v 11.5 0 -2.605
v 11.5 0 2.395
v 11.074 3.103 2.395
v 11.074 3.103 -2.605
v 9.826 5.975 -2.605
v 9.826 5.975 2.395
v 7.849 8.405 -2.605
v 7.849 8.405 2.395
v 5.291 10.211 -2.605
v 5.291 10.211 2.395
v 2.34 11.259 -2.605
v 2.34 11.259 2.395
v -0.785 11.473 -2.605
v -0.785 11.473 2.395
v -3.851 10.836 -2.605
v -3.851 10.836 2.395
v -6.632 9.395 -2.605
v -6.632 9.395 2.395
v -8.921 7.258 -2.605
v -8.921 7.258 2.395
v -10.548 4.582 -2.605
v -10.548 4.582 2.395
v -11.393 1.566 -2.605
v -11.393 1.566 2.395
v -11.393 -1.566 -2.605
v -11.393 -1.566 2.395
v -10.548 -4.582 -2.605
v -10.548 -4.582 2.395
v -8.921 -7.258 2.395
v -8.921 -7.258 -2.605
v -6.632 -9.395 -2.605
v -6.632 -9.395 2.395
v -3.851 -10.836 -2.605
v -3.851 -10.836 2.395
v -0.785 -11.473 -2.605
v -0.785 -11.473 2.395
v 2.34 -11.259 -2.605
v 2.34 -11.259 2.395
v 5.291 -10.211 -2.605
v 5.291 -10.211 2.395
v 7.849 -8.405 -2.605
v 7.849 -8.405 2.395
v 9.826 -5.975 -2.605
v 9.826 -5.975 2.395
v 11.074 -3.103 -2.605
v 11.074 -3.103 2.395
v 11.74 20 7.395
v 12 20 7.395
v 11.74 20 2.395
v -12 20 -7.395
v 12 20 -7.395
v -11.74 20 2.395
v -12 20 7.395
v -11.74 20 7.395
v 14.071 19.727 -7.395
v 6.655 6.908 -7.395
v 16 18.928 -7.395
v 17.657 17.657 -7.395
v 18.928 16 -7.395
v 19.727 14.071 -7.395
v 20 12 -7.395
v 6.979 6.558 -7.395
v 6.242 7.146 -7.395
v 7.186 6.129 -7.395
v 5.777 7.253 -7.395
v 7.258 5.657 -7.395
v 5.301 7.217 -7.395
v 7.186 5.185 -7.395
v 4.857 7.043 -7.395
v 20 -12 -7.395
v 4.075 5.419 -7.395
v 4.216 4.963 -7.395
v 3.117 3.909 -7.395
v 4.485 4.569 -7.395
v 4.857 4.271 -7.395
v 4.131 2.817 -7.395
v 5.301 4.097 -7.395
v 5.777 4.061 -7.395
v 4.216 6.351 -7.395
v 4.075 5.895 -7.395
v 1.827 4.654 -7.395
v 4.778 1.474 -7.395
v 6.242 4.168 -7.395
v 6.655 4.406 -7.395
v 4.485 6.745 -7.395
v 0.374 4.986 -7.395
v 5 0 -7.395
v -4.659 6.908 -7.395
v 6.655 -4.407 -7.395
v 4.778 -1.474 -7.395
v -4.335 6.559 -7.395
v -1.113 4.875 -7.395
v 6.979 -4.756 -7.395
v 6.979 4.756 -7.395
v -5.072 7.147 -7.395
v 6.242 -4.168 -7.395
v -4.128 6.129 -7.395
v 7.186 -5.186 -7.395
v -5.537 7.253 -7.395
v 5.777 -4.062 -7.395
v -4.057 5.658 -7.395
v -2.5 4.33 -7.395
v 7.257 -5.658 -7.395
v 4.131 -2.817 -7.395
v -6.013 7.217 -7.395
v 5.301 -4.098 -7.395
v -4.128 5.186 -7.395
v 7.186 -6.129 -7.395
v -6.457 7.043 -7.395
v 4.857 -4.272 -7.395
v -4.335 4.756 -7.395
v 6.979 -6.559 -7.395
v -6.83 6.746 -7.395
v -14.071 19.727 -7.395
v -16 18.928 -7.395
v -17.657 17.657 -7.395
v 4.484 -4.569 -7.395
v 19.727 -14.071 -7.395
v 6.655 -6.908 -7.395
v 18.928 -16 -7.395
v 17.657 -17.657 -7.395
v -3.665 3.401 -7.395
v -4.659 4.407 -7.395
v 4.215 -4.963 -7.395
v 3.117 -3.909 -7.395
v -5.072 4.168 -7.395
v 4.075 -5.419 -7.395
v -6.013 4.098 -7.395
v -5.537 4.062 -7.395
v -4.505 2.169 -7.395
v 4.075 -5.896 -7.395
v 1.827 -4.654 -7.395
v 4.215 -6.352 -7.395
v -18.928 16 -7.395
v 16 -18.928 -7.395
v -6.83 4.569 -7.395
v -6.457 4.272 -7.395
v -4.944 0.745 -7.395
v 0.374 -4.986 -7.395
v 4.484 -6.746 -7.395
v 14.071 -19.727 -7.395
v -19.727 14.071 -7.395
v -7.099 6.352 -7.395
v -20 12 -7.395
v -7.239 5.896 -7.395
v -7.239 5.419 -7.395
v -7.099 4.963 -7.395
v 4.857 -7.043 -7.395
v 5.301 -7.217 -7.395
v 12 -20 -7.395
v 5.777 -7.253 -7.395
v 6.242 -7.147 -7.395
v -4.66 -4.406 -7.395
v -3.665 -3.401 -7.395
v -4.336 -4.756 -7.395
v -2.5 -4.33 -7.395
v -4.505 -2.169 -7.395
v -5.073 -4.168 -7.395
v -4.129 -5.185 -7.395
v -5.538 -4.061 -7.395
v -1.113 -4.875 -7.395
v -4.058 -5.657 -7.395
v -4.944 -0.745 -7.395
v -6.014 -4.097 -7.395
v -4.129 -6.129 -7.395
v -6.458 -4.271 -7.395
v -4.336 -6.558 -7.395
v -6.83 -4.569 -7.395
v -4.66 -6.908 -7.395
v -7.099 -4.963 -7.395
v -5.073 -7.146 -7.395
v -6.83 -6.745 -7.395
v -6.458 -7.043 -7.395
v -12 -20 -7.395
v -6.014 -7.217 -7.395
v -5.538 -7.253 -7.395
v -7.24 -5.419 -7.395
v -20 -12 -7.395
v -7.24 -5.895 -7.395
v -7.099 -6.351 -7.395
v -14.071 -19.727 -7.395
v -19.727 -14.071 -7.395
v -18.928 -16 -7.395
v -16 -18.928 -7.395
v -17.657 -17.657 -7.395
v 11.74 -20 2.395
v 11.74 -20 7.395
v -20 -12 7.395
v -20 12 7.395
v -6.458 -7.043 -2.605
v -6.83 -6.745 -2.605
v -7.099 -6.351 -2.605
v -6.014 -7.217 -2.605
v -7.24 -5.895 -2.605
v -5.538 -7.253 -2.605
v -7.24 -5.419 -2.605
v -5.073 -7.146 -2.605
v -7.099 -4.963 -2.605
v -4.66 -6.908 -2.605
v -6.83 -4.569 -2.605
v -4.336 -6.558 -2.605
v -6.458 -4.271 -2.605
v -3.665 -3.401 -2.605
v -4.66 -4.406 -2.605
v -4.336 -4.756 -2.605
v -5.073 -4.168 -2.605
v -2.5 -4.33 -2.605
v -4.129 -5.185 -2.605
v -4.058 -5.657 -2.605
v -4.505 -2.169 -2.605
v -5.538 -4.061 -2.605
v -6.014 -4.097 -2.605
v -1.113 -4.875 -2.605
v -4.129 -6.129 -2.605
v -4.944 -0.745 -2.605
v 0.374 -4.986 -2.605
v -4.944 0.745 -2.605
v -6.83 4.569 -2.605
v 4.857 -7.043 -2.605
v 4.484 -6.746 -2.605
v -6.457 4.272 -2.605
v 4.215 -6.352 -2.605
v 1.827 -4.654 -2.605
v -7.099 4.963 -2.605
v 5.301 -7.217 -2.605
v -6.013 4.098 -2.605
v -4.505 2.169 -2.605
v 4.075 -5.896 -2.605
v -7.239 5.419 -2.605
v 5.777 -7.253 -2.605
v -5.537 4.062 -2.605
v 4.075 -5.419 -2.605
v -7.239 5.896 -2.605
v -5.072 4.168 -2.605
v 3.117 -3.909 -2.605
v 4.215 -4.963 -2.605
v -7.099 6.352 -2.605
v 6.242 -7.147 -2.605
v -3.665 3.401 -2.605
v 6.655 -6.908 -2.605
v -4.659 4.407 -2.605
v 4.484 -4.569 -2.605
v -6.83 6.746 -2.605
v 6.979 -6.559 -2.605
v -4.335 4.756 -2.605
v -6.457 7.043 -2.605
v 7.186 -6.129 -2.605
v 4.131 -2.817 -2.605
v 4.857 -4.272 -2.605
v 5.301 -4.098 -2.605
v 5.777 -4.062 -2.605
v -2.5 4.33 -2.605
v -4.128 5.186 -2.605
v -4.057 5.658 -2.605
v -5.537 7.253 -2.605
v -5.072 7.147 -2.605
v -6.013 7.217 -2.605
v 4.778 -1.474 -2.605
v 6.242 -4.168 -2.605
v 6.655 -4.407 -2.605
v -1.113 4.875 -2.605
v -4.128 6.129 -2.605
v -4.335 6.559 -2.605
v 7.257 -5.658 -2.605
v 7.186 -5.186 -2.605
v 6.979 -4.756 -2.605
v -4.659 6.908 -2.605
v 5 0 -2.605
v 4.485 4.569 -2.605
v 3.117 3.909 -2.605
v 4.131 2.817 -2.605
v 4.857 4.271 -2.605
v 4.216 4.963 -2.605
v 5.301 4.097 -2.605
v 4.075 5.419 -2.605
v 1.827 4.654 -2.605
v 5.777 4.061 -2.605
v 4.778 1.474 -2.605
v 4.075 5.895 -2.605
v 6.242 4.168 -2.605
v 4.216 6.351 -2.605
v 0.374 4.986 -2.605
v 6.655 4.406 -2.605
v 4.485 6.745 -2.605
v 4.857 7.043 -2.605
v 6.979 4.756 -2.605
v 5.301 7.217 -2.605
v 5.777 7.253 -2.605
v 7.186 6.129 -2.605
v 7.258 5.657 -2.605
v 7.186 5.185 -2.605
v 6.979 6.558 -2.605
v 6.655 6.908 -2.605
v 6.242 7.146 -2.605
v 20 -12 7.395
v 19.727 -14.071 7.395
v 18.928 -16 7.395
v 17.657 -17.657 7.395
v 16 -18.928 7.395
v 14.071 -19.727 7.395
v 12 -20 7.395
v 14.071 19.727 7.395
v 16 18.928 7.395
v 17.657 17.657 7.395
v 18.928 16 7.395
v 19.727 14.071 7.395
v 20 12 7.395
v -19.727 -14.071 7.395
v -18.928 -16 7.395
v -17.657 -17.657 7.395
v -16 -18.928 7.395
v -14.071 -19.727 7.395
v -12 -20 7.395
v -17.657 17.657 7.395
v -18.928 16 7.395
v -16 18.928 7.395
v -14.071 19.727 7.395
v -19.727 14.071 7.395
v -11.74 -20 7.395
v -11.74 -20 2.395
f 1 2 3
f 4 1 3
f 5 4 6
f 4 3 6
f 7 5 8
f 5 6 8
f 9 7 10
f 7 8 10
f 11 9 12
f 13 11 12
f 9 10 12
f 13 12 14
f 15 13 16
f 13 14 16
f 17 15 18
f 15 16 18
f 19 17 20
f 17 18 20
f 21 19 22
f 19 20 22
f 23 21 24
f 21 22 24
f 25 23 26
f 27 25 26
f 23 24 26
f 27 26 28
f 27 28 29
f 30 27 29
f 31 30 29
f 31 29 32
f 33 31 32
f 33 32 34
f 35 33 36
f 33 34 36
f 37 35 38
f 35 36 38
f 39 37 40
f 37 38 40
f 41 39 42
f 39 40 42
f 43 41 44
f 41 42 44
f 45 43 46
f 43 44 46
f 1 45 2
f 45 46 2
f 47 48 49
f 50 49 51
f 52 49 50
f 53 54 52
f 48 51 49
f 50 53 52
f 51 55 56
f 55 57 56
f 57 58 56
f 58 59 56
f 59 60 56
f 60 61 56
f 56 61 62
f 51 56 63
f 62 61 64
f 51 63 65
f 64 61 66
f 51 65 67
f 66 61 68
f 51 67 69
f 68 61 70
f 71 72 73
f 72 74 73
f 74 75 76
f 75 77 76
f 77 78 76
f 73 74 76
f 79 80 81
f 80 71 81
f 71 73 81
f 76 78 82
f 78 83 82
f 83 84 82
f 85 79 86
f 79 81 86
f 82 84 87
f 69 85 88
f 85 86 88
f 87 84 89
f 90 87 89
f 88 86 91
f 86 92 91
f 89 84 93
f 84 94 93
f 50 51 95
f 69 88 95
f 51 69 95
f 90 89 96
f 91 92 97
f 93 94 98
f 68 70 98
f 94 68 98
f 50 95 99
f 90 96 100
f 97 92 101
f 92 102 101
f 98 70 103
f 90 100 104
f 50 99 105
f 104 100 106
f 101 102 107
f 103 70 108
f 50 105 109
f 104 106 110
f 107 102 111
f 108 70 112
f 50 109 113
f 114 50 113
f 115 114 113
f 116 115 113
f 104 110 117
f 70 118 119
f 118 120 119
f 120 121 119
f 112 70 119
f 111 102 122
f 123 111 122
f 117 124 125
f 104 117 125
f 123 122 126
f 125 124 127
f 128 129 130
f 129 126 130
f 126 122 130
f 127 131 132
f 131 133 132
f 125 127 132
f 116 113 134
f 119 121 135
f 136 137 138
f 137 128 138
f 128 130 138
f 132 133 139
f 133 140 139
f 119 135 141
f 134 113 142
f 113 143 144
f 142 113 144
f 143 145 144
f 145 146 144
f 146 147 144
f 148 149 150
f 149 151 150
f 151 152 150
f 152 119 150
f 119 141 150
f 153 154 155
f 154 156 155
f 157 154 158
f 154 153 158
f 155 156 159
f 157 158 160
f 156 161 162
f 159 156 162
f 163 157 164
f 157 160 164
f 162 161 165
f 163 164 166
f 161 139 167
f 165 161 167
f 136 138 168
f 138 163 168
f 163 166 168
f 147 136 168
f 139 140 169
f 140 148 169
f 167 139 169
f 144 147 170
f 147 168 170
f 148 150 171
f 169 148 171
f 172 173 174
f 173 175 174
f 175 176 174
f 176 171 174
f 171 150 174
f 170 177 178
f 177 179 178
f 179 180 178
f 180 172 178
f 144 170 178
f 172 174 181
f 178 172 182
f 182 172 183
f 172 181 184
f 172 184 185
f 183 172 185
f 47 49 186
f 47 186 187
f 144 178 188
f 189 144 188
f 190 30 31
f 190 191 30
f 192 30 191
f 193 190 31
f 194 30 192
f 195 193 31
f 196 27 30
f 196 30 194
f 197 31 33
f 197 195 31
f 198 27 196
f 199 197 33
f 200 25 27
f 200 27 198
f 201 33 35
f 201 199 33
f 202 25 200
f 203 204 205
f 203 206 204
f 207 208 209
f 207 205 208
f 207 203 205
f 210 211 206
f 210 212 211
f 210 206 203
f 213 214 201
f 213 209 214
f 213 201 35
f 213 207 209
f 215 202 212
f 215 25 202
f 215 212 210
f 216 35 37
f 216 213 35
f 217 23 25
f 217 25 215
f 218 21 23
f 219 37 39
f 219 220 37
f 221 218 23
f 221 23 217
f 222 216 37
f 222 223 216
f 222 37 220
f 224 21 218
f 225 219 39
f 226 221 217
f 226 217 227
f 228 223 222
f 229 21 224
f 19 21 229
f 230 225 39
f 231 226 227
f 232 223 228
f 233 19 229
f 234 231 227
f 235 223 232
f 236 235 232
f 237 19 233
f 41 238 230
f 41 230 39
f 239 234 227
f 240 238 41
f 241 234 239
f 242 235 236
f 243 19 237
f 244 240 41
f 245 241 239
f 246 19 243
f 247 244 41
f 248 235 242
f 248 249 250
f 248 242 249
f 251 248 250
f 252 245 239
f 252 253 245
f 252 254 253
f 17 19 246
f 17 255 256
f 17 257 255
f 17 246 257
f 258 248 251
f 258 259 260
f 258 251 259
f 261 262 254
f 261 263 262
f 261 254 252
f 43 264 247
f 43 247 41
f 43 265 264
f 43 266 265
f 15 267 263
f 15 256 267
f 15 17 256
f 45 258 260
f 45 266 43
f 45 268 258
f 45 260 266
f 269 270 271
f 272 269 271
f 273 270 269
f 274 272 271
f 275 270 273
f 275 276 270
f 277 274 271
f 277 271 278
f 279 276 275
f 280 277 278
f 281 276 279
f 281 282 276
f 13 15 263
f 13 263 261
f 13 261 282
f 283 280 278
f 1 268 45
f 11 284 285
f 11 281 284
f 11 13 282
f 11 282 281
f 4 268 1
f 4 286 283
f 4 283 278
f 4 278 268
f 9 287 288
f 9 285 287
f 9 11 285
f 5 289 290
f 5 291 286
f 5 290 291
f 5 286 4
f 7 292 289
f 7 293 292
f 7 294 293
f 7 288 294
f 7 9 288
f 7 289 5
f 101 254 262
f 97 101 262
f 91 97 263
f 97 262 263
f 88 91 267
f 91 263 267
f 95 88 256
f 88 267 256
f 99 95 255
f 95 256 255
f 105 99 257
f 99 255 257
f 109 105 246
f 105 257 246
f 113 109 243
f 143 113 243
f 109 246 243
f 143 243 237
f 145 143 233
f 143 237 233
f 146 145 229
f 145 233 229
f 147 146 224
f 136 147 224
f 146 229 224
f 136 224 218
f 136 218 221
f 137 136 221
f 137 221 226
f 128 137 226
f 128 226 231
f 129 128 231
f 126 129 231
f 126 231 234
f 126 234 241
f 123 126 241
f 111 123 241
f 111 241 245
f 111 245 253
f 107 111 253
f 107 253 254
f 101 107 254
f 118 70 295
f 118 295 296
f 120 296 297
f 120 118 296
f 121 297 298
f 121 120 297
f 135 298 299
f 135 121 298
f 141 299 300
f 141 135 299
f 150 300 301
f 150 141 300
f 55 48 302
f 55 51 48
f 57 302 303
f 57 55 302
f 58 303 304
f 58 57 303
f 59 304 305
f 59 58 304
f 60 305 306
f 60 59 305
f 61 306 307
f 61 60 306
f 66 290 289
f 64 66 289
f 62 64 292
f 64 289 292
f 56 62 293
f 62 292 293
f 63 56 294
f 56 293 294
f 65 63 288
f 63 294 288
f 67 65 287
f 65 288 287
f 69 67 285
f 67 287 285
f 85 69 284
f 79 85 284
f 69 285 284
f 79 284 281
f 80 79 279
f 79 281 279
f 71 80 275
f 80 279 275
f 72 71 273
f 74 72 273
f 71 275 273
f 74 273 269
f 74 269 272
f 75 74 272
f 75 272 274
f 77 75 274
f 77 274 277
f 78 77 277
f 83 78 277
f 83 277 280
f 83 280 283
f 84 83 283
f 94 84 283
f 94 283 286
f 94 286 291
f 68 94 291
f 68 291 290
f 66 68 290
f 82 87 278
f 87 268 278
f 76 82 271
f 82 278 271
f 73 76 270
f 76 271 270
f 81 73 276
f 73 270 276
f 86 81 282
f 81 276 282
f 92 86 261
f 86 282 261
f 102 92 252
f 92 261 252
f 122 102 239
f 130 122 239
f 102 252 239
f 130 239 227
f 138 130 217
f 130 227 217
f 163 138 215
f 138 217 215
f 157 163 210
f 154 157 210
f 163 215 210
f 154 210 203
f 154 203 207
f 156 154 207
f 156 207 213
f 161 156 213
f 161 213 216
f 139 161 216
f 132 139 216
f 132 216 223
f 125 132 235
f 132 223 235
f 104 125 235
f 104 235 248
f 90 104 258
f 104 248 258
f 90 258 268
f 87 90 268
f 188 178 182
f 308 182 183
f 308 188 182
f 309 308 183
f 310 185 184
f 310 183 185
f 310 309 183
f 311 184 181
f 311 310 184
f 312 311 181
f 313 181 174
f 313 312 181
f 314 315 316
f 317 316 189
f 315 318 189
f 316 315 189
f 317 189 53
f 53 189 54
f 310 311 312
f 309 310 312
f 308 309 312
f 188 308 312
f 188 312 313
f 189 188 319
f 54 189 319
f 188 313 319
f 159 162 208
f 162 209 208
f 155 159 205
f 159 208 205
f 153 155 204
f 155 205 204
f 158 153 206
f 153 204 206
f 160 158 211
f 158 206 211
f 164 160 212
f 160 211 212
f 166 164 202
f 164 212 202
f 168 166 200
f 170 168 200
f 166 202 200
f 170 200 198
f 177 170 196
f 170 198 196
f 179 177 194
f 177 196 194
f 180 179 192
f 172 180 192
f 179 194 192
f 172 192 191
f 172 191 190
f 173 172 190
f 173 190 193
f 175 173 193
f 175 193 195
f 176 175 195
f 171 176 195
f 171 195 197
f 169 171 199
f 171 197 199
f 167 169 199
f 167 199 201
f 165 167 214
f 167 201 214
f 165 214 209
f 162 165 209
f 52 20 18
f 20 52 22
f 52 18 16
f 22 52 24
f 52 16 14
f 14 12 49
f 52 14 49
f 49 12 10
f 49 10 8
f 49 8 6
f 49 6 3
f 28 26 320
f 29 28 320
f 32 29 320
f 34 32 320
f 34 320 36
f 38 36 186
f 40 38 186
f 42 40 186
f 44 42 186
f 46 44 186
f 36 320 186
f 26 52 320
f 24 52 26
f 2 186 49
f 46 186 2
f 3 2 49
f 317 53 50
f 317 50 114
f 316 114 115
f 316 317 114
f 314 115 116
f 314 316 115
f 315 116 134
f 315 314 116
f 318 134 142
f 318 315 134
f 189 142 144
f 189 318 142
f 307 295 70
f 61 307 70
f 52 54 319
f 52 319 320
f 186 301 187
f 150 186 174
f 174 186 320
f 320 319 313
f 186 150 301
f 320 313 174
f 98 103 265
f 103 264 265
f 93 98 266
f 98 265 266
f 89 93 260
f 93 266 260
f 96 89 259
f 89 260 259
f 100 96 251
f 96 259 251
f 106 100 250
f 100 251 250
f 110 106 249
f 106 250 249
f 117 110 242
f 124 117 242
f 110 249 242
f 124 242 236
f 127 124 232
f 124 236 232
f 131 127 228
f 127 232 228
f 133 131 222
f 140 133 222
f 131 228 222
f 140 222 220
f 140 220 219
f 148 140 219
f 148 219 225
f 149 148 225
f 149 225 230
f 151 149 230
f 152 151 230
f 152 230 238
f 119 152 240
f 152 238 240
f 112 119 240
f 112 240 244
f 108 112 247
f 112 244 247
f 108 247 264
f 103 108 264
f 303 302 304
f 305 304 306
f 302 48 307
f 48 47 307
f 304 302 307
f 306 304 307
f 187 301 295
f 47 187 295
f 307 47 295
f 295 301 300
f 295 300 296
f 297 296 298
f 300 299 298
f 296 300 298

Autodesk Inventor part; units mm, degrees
ref_plane "YZ Plane" through (0, 0, 0) normal (1, 0, 0) x (0, 1, 0)
ref_plane "XZ Plane" through (0, 0, 0) normal (0, 1, 0) x (-1, 0, 0)
ref_plane "XY Plane" through (0, 0, 0) normal (0, 0, 1) x (1, 0, 0)
sketch "Sketch1" plane through (0, 0, 0) normal (0, 1, 0) x (-1, 0, 0)
  line L0 (-20, 7.395) -> (-20, -7.395)
  line L1 (-20, -7.395) -> (20, -7.395)
  line L2 (20, -7.395) -> (20, 7.395)
  line L3 (20, 7.395) -> (11.74, 7.395)
  line L4 (11.74, 7.395) -> (11.74, 2.395)
  line L5 (11.74, 2.395) -> (-11.74, 2.395)
  line L6 (-11.74, 2.395) -> (-11.74, 7.395)
  line L7 (-11.74, 7.395) -> (-20, 7.395)
  point P0 (0, 0)
  point P1 (-20, 0)
  point P2 (-15.87, 7.395)
  point P3 (15.87, 7.395)
  point P4 (0, 2.395)
  dimension "d0" = 40
  dimension "d1" = 14.79
  dimension "d2" = 8.26
  dimension "d3" = 8.26
  dimension "d4" = 5
extrude "Extrusion1" add sketch "Sketch1" along normal mid plane 40
sketch "Sketch2" plane through (-11.74, 20, 2.395) normal (0, 0, 1) x (1, 0, 0)
  circle A0 centre (11.74, -20) radius 11.5
  dimension "d7" = 23
extrude "Extrusion2" cut sketch "Sketch2" against normal blind 5
sketch "Sketch3" plane through (0, 0, -2.605) normal (0, 0, 1) x (1, 0, 0)
  circle A0 centre (0, 0) radius 5
  dimension "d10" = 10
extrude "Extrusion3" cut sketch "Sketch3" against normal up to next
sketch "Sketch4" plane through (0, 0, -2.605) normal (0, 0, 1) x (1, 0, 0)
  circle A0 centre (-5.657, 5.6575) radius 1.6
  circle A1 centre (-5.6575, -5.657) radius 1.6
  circle A2 centre (5.657, -5.6575) radius 1.6
  circle A3 centre (5.6575, 5.657) radius 1.6
  point P0 (0, 0)
  dimension "d13" = 5.657
  dimension "d14" = 5.6575
  dimension "d15" = 3.2
  dimension "d18" = 360
extrude "Extrusion4" cut sketch "Sketch4" against normal up to next
fillet "Fillet1" radius 8 4 edges at (-20, -20, 0) (20, -20, 0) (20, 20, 0) (-20, 20, 0)
properties part number "OldhamCouplerBottom"
